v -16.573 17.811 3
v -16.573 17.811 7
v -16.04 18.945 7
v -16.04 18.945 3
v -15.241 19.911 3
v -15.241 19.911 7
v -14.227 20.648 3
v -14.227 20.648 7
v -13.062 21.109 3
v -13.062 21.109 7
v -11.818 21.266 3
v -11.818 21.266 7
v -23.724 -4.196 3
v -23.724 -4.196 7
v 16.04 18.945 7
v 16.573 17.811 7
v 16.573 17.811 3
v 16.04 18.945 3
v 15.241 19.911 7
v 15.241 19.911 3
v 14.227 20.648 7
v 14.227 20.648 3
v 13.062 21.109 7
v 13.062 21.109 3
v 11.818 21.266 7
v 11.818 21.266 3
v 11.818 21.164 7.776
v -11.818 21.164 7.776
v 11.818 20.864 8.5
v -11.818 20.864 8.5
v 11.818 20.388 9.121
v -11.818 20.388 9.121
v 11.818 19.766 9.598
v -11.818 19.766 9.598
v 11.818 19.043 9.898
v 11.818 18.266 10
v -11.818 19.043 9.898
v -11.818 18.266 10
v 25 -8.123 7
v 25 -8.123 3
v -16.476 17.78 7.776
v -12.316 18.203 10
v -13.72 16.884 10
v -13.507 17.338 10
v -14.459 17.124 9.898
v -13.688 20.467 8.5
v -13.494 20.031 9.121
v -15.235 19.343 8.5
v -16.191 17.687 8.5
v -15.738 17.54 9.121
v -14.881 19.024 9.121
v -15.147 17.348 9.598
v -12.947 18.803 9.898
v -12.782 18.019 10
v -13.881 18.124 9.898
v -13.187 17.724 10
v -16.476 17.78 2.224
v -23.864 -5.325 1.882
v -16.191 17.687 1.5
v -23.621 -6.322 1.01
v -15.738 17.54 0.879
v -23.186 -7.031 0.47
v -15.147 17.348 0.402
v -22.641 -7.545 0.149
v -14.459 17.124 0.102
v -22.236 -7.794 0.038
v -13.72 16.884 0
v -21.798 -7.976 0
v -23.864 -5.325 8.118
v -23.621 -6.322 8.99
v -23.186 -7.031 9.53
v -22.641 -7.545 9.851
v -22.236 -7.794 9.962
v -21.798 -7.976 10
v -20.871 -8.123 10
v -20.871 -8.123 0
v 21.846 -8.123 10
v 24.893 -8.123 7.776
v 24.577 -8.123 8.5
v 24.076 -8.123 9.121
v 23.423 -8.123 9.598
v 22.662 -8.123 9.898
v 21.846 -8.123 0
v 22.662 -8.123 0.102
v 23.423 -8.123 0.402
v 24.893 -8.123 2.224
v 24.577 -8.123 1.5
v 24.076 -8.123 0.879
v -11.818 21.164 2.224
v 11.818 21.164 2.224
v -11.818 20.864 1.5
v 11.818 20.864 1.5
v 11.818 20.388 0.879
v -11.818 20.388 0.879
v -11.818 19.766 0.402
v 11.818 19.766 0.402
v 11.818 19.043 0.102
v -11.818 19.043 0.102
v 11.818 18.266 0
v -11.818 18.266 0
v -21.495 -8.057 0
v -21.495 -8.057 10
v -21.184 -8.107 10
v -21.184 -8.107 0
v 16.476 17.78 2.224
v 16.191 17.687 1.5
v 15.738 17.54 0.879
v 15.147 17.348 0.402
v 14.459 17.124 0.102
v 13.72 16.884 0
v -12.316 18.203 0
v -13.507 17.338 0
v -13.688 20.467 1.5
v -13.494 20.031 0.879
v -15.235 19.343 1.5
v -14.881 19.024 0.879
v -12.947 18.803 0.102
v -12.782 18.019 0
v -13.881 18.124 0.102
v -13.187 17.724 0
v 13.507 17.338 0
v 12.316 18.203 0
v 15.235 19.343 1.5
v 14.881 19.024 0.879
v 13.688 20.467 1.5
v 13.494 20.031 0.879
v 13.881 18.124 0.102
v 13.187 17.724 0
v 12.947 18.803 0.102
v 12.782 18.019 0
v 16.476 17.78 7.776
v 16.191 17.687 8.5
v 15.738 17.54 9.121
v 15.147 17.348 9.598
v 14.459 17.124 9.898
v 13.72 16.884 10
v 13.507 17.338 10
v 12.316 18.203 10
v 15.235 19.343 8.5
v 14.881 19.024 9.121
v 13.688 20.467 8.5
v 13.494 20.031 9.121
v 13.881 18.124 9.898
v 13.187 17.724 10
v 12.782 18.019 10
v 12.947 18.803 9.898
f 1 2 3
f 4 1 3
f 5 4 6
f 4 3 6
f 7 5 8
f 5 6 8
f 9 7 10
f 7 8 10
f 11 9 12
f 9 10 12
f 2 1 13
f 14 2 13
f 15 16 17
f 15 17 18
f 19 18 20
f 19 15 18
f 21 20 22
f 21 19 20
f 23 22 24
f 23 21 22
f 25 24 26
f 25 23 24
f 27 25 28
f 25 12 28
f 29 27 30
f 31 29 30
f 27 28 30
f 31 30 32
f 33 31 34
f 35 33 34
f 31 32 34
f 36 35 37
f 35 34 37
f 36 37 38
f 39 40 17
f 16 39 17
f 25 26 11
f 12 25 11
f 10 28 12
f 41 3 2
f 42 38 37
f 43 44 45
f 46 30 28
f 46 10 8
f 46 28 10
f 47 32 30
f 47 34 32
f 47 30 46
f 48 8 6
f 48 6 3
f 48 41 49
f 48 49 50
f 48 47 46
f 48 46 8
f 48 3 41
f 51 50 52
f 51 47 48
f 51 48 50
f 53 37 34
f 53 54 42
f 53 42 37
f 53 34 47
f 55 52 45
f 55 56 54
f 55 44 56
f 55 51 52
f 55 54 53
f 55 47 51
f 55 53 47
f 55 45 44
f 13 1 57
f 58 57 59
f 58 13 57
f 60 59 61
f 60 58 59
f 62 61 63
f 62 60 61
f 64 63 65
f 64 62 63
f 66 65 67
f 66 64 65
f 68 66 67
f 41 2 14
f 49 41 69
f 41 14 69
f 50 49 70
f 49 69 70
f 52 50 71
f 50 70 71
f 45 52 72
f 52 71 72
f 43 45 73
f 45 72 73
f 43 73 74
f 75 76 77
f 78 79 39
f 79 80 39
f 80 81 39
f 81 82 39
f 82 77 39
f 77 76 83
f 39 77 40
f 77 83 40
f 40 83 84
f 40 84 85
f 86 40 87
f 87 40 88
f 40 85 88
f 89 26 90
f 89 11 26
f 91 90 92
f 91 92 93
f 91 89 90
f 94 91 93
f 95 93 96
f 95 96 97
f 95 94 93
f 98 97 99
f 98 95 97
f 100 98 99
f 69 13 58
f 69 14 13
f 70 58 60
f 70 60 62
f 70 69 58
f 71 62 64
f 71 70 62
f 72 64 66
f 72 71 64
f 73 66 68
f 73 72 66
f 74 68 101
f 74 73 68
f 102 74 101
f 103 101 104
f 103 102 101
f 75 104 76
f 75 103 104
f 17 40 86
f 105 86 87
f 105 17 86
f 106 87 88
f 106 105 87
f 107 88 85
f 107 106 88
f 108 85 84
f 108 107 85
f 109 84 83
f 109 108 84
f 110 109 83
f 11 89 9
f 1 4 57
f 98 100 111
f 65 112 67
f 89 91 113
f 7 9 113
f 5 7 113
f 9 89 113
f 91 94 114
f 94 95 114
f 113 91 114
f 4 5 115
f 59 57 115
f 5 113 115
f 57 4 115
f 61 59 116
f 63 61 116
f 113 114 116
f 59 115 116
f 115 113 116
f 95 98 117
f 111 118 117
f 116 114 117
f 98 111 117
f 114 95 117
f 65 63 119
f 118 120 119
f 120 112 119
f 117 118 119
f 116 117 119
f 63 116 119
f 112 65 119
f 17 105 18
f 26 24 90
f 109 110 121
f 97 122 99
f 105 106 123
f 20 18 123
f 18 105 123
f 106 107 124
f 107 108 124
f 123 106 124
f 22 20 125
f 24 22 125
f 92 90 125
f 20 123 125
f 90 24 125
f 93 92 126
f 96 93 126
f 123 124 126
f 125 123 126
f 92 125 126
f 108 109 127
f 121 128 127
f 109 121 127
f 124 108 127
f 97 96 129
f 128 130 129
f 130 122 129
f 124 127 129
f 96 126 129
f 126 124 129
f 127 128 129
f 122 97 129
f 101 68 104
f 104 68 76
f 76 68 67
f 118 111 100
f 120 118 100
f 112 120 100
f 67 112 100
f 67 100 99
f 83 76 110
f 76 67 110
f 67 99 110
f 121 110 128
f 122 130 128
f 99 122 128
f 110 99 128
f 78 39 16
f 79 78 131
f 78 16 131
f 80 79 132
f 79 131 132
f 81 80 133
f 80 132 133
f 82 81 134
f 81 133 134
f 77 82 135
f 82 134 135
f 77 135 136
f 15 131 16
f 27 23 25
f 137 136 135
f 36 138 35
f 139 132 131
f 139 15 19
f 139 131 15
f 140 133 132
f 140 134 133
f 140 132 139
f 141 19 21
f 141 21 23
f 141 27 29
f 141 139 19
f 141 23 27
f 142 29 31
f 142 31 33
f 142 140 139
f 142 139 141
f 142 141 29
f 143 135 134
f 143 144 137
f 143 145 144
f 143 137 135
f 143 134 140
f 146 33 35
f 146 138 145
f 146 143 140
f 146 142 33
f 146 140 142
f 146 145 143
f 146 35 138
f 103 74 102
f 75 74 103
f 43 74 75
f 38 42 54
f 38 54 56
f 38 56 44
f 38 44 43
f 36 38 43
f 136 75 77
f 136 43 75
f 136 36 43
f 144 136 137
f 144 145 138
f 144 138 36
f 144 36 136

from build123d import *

# Parameters (mm, degrees)
F1_DEPTH = 10
F2_R     = 5
F3_R     = 3


with BuildPart() as f1:
    # F0 (on Top) → F1 (new body)
    with BuildSketch(Plane.XY):
        Polygon((-15.45085, 21.26627), (-25, -8.122992), (25, -8.122992), (15.45085, 21.26627), align=None)
    extrude(amount=F1_DEPTH)

    # F2
    f2_edges = [f1.edges().sort_by_distance(p)[0] for p in [
        (-15.45085, 21.26627, 5),
        (15.45085, 21.26627, 5),
    ]]
    fillet(f2_edges, radius=F2_R)

    # F3
    f3_edges = [f1.edges().sort_by_distance(p)[0] for p in [
        (-20.78671, 4.844181, 0),
        (-16.57342, 17.811355, 5),
        (-25, -8.122992, 5),
        (-20.78671, 4.844181, 10),
    ]]
    fillet(f3_edges, radius=F3_R)


solid = f1.part
